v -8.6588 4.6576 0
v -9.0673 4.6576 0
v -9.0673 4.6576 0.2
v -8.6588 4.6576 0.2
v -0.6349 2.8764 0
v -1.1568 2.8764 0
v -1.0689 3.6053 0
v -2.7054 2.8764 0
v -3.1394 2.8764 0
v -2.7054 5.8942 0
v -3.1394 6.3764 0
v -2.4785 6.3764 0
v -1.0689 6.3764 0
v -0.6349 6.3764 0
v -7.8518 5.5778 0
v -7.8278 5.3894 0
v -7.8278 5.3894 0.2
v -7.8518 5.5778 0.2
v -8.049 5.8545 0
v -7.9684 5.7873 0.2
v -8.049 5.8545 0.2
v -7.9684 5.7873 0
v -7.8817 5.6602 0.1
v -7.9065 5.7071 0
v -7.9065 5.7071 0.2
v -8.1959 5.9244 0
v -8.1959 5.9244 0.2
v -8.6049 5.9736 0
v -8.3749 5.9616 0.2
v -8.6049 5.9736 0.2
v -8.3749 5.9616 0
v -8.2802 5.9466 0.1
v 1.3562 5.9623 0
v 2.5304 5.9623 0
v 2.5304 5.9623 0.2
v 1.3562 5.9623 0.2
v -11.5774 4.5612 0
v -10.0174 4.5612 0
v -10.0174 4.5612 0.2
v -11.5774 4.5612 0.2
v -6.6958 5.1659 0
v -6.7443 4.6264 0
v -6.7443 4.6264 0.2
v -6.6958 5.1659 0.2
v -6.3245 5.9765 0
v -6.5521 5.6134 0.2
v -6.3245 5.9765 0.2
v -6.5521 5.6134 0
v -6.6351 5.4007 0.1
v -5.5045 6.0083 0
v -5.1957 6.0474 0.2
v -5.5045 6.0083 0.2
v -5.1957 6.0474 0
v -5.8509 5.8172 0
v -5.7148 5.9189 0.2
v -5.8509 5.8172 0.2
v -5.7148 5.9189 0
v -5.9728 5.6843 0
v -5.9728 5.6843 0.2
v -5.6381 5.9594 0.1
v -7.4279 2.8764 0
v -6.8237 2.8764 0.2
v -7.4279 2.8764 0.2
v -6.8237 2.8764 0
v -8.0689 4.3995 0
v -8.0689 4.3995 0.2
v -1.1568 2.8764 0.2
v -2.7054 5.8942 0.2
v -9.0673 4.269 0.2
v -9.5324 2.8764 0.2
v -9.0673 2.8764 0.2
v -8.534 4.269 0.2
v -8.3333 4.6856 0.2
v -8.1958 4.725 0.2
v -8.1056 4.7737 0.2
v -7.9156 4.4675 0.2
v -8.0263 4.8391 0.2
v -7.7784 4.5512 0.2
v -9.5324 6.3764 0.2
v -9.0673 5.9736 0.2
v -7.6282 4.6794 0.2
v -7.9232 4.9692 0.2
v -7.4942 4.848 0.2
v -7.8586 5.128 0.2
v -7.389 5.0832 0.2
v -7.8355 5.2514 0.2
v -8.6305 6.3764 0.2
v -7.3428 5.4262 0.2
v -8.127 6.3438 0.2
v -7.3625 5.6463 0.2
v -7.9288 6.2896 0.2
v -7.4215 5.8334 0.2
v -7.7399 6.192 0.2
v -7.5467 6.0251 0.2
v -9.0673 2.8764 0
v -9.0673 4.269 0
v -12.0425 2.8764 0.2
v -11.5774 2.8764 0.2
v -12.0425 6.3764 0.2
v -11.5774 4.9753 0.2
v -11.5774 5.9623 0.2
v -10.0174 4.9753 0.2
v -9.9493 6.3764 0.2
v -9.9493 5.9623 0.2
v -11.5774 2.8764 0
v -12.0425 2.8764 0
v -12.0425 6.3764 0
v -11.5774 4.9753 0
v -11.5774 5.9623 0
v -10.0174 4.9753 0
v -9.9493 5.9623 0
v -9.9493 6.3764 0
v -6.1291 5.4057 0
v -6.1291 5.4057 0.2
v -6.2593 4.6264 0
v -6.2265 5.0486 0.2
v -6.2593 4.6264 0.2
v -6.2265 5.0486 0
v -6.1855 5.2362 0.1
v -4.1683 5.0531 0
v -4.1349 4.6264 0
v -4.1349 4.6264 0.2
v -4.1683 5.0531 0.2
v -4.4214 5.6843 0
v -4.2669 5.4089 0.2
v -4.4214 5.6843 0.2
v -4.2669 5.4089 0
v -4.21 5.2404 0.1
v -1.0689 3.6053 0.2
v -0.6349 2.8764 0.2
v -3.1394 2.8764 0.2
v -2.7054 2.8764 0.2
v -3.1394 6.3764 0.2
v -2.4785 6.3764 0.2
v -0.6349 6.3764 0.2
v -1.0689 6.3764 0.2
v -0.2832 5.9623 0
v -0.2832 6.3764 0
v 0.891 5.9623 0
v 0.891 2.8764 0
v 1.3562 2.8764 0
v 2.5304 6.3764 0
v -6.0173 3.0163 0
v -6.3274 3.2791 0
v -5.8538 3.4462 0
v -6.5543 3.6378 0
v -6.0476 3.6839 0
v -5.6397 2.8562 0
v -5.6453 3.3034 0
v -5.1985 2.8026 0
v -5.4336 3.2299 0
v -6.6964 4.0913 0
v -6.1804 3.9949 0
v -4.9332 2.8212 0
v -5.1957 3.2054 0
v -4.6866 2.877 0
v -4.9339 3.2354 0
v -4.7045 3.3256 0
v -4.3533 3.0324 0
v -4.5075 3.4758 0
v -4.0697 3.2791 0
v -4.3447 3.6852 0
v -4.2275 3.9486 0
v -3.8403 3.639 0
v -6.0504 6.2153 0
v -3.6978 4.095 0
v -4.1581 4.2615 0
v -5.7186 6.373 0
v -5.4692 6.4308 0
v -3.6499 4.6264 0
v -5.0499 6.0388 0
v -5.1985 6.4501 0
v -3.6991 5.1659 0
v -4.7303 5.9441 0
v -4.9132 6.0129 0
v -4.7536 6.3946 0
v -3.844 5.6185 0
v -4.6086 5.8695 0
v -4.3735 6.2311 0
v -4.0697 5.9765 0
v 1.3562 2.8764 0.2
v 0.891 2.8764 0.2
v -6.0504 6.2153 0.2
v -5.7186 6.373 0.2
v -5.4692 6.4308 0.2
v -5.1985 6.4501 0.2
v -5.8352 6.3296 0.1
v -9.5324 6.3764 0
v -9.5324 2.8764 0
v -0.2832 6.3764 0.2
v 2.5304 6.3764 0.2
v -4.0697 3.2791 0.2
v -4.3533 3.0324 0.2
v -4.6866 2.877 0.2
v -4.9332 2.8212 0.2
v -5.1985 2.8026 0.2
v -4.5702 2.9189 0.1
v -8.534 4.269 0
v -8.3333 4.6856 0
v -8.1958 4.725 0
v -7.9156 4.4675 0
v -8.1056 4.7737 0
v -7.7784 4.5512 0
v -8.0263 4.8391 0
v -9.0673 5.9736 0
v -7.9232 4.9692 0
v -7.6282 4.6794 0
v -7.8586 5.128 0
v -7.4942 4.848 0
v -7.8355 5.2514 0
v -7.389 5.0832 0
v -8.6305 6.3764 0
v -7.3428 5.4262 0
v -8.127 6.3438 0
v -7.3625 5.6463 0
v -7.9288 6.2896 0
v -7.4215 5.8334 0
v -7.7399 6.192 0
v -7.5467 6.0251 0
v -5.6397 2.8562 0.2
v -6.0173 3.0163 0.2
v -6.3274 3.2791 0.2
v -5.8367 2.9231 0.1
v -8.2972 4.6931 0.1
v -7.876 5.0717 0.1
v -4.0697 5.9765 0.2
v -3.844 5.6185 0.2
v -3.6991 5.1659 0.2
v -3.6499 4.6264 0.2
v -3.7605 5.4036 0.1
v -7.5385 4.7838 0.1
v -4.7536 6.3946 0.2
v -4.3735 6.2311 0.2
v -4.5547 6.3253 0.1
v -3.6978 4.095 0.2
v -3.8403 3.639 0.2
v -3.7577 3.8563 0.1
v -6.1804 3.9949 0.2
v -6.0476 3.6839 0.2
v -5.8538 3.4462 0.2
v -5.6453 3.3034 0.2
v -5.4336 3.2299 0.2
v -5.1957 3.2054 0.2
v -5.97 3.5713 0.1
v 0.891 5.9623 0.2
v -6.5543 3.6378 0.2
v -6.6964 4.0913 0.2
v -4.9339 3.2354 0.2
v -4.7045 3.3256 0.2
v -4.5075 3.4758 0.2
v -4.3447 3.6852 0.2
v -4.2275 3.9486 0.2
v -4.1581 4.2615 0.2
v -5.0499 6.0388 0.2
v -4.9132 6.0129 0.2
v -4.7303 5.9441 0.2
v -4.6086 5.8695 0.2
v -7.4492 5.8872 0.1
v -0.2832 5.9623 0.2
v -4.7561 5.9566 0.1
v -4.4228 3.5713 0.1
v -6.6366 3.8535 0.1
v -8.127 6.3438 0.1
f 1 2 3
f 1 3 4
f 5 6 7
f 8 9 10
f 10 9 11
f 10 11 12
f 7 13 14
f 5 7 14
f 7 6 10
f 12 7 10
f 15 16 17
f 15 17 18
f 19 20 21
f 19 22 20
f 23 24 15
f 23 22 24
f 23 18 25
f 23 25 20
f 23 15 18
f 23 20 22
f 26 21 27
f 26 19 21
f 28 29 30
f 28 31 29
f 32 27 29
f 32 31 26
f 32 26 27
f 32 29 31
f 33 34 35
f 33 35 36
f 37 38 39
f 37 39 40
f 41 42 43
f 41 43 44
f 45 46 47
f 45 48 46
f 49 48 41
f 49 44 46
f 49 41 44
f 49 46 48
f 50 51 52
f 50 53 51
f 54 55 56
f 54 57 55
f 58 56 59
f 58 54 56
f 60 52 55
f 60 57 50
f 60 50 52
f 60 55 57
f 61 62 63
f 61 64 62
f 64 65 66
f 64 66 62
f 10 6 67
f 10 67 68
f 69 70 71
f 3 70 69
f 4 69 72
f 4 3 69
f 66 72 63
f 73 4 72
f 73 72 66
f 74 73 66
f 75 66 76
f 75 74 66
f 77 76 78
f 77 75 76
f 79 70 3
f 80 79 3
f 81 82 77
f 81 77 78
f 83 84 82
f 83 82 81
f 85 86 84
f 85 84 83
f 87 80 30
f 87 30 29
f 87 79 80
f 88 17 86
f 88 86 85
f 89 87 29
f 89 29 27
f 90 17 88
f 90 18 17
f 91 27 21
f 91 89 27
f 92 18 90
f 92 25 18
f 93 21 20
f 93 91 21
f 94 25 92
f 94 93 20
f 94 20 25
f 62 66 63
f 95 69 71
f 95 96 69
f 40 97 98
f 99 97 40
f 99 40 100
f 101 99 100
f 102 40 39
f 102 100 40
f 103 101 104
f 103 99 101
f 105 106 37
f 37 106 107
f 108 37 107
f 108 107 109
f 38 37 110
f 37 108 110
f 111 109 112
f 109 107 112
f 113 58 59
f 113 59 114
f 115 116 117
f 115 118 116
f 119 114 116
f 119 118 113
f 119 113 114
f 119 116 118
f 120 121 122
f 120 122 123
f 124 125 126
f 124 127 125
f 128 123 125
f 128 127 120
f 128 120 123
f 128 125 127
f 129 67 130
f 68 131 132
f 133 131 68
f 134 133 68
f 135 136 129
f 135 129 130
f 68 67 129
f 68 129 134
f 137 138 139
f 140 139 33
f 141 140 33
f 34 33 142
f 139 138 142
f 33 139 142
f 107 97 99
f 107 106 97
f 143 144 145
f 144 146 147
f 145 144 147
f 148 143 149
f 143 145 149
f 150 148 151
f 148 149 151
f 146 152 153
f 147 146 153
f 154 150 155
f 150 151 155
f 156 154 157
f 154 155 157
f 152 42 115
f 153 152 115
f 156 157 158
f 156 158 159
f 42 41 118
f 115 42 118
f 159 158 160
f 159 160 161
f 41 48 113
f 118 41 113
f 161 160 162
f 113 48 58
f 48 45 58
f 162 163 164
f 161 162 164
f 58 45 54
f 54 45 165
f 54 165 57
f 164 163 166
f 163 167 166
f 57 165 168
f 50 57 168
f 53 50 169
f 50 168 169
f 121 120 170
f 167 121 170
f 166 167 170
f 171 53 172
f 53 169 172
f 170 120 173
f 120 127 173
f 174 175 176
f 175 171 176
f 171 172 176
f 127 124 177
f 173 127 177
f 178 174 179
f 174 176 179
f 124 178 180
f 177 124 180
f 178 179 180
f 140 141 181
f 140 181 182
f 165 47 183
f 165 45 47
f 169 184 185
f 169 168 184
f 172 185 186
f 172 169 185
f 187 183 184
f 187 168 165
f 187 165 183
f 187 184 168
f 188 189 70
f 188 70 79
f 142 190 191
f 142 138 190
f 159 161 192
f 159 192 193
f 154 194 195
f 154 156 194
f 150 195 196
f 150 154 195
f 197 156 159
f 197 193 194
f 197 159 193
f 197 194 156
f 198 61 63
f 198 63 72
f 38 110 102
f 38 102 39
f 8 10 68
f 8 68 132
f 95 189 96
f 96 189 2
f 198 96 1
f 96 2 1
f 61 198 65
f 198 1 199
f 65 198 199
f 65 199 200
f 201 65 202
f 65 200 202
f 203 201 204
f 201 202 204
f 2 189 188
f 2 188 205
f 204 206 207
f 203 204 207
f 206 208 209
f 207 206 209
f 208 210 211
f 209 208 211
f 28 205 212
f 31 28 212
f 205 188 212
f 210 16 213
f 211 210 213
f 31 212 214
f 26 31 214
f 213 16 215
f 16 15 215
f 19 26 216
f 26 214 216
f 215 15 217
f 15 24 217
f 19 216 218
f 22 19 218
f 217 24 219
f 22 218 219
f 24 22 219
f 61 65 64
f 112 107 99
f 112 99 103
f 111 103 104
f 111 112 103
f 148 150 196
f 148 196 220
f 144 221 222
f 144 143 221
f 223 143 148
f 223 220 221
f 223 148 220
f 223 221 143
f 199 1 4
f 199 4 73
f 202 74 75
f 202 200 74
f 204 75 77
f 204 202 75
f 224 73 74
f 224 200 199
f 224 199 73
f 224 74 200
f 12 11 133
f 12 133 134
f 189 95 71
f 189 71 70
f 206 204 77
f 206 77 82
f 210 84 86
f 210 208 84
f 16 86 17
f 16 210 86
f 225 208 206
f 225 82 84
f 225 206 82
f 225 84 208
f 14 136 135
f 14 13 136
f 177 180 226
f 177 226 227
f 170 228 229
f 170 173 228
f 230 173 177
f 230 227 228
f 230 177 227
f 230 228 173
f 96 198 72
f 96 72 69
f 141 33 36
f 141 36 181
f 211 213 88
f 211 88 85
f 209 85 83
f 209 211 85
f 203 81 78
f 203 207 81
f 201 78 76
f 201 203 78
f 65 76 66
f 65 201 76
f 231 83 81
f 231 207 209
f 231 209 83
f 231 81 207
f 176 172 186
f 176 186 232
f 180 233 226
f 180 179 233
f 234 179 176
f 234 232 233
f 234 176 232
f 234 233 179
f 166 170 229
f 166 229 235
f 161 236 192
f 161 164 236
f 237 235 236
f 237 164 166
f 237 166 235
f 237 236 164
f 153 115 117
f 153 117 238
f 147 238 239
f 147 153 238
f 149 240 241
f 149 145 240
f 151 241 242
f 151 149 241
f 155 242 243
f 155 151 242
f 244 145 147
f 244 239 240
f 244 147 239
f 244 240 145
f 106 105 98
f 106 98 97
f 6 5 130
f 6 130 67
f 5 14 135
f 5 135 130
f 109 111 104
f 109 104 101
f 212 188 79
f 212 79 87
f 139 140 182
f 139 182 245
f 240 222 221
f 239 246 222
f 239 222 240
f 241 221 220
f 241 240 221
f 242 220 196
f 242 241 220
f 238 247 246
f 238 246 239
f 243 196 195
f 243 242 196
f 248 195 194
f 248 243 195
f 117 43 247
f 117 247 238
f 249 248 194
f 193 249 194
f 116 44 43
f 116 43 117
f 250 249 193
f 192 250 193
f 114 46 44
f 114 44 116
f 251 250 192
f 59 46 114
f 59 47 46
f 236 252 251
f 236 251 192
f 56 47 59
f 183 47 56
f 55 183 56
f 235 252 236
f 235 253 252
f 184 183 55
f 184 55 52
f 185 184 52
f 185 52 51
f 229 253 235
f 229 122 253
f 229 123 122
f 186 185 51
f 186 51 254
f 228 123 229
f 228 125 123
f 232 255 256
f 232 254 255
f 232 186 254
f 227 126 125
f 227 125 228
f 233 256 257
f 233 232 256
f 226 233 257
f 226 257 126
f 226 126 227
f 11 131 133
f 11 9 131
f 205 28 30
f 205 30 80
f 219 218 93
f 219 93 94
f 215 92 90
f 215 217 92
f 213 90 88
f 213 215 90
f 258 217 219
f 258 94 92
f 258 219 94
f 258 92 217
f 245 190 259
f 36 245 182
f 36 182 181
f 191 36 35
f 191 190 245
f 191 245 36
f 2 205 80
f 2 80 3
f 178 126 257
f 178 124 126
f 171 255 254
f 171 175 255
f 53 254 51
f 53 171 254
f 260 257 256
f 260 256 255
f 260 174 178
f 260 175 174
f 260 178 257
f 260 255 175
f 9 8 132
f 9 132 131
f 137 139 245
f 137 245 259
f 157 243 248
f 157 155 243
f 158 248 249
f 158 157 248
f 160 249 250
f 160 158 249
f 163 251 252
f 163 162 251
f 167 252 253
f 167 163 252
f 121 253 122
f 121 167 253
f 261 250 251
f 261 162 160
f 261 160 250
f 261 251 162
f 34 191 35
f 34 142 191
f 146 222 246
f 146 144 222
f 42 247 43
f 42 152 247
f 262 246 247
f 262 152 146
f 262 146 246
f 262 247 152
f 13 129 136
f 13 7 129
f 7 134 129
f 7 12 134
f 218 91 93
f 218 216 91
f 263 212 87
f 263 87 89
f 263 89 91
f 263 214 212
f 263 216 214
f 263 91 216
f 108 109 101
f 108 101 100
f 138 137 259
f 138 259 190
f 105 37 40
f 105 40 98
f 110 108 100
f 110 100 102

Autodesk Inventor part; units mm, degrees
ref_plane "YZ Plane" through (0, 0, 0) normal (1, 0, 0) x (0, 1, 0)
ref_plane "XZ Plane" through (0, 0, 0) normal (0, 1, 0) x (-1, 0, 0)
ref_plane "XY Plane" through (0, 0, 0) normal (0, 0, 1) x (1, 0, 0)
sketch "Sketch1" plane through (0, 0, 0) normal (0, 0, 1) x (1, 0, 0)
  line L0 (-12.3971, 6.4501) -> (24.1995, 6.4501) construction
  line L1 (24.1995, 6.4501) -> (24.1995, -12.763) construction
  line L2 (24.1995, -12.763) -> (-12.3971, -12.763) construction
  line L3 (-12.3971, -12.763) -> (-12.3971, 6.4501) construction
  line L4 (-9.9493, 5.9623) -> (-11.5774, 5.9623)
  line L5 (-11.5774, 5.9623) -> (-11.5774, 4.9753)
  line L6 (-11.5774, 4.9753) -> (-10.0174, 4.9753)
  line L7 (-10.0174, 4.9753) -> (-10.0174, 4.5612)
  line L8 (-10.0174, 4.5612) -> (-11.5774, 4.5612)
  line L9 (-11.5774, 4.5612) -> (-11.5774, 2.8764)
  line L10 (-11.5774, 2.8764) -> (-12.0425, 2.8764)
  line L11 (-12.0425, 2.8764) -> (-12.0425, 6.3764)
  line L12 (-12.0425, 6.3764) -> (-9.9493, 6.3764)
  line L13 (-9.9493, 6.3764) -> (-9.9493, 5.9623)
  line L14 (-6.8237, 2.8764) -> (-7.4279, 2.8764)
  line L15 (-7.4279, 2.8764) -> (-8.534, 4.269)
  line L16 (-8.534, 4.269) -> (-9.0673, 4.269)
  line L17 (-9.0673, 4.269) -> (-9.0673, 2.8764)
  line L18 (-9.0673, 2.8764) -> (-9.5324, 2.8764)
  line L19 (-9.5324, 2.8764) -> (-9.5324, 6.3764)
  line L20 (-9.5324, 6.3764) -> (-8.6305, 6.3764)
  spline S0 degree 2 poles (-8.6305, 6.3764) (-8.3298, 6.3764) (-7.9242, 6.3112) (-7.7399, 6.192) knots 0 0 0 1 2 2 2
  spline S1 degree 2 poles (-7.7399, 6.192) (-7.5555, 6.0729) (-7.3428, 5.7014) (-7.3428, 5.4262) knots 0 0 0 1 2 2 2
  spline S2 degree 2 poles (-7.3428, 5.4262) (-7.3428, 5.0433) (-7.7342, 4.5243) (-8.0689, 4.3995) knots 0 0 0 1 2 2 2
  line L21 (-8.0689, 4.3995) -> (-6.8237, 2.8764)
  spline S3 degree 2 poles (-7.8278, 5.3894) (-7.8278, 5.5425) (-7.9356, 5.7779) (-8.049, 5.8545) knots 0 0 0 1 2 2 2
  spline S4 degree 2 poles (-8.049, 5.8545) (-8.1483, 5.9197) (-8.4121, 5.9736) (-8.6049, 5.9736) knots 0 0 0 1 2 2 2
  line L22 (-8.6049, 5.9736) -> (-9.0673, 5.9736)
  line L23 (-9.0673, 5.9736) -> (-9.0673, 4.6576)
  line L24 (-9.0673, 4.6576) -> (-8.6588, 4.6576)
  spline S5 degree 2 poles (-8.6588, 4.6576) (-8.4574, 4.6576) (-8.1369, 4.7285) (-8.0263, 4.8391) knots 0 0 0 1 2 2 2
  spline S6 degree 2 poles (-8.0263, 4.8391) (-7.9242, 4.9356) (-7.8278, 5.2078) (-7.8278, 5.3894) knots 0 0 0 1 2 2 2
  spline S7 degree 2 poles (-4.0697, 5.9765) (-3.8711, 5.7439) (-3.6499, 5.0632) (-3.6499, 4.6264) knots 0 0 0 1 2 2 2
  spline S8 degree 2 poles (-3.6499, 4.6264) (-3.6499, 4.2009) (-3.8655, 3.5117) (-4.0697, 3.2791) knots 0 0 0 1 2 2 2
  spline S9 degree 2 poles (-4.0697, 3.2791) (-4.2852, 3.0352) (-4.8553, 2.8026) (-5.1985, 2.8026) knots 0 0 0 1 2 2 2
  spline S10 degree 2 poles (-5.1985, 2.8026) (-5.5531, 2.8026) (-6.1203, 3.0437) (-6.3274, 3.2791) knots 0 0 0 1 2 2 2
  spline S11 degree 2 poles (-6.3274, 3.2791) (-6.5288, 3.5117) (-6.7443, 4.1953) (-6.7443, 4.6264) knots 0 0 0 1 2 2 2
  spline S12 degree 2 poles (-6.7443, 4.6264) (-6.7443, 5.066) (-6.5259, 5.7354) (-6.3245, 5.9765) knots 0 0 0 1 2 2 2
  spline S13 degree 2 poles (-6.3245, 5.9765) (-6.1203, 6.2091) (-5.5502, 6.4501) (-5.1985, 6.4501) knots 0 0 0 1 2 2 2
  spline S14 degree 2 poles (-5.1985, 6.4501) (-4.8412, 6.4501) (-4.2682, 6.2005) (-4.0697, 5.9765) knots 0 0 0 1 2 2 2
  spline S15 degree 2 poles (-4.1349, 4.6264) (-4.1349, 4.9724) (-4.2852, 5.5085) (-4.4214, 5.6843) knots 0 0 0 1 2 2 2
  spline S16 degree 2 poles (-4.4214, 5.6843) (-4.5604, 5.8659) (-4.9518, 6.0474) (-5.1957, 6.0474) knots 0 0 0 1 2 2 2
  spline S17 degree 2 poles (-5.1957, 6.0474) (-5.4481, 6.0474) (-5.8282, 5.8715) (-5.9728, 5.6843) knots 0 0 0 1 2 2 2
  spline S18 degree 2 poles (-5.9728, 5.6843) (-6.1118, 5.5056) (-6.2593, 4.9667) (-6.2593, 4.6264) knots 0 0 0 1 2 2 2
  spline S19 degree 2 poles (-6.2593, 4.6264) (-6.2593, 3.9372) (-5.6807, 3.2054) (-5.1957, 3.2054) knots 0 0 0 1 2 2 2
  spline S20 degree 2 poles (-5.1957, 3.2054) (-4.7107, 3.2054) (-4.1349, 3.9372) (-4.1349, 4.6264) knots 0 0 0 1 2 2 2
  line L25 (-0.6349, 2.8764) -> (-1.1568, 2.8764)
  line L26 (-1.1568, 2.8764) -> (-2.7054, 5.8942)
  line L27 (-2.7054, 5.8942) -> (-2.7054, 2.8764)
  line L28 (-2.7054, 2.8764) -> (-3.1394, 2.8764)
  line L29 (-3.1394, 2.8764) -> (-3.1394, 6.3764)
  line L30 (-3.1394, 6.3764) -> (-2.4785, 6.3764)
  line L31 (-2.4785, 6.3764) -> (-1.0689, 3.6053)
  line L32 (-1.0689, 3.6053) -> (-1.0689, 6.3764)
  line L33 (-1.0689, 6.3764) -> (-0.6349, 6.3764)
  line L34 (-0.6349, 6.3764) -> (-0.6349, 2.8764)
  line L35 (0.891, 2.8764) -> (0.891, 5.9623)
  line L36 (0.891, 5.9623) -> (-0.2832, 5.9623)
  line L37 (-0.2832, 5.9623) -> (-0.2832, 6.3764)
  line L38 (-0.2832, 6.3764) -> (2.5304, 6.3764)
  line L39 (2.5304, 6.3764) -> (2.5304, 5.9623)
  line L40 (2.5304, 5.9623) -> (1.3562, 5.9623)
  line L41 (1.3562, 5.9623) -> (1.3562, 2.8764)
  line L42 (1.3562, 2.8764) -> (0.891, 2.8764)
  point P0 (0, 0)
extrude "FrontLabel" add sketch "Sketch1" along normal blind 0.2
properties part number "FrontLabel"
